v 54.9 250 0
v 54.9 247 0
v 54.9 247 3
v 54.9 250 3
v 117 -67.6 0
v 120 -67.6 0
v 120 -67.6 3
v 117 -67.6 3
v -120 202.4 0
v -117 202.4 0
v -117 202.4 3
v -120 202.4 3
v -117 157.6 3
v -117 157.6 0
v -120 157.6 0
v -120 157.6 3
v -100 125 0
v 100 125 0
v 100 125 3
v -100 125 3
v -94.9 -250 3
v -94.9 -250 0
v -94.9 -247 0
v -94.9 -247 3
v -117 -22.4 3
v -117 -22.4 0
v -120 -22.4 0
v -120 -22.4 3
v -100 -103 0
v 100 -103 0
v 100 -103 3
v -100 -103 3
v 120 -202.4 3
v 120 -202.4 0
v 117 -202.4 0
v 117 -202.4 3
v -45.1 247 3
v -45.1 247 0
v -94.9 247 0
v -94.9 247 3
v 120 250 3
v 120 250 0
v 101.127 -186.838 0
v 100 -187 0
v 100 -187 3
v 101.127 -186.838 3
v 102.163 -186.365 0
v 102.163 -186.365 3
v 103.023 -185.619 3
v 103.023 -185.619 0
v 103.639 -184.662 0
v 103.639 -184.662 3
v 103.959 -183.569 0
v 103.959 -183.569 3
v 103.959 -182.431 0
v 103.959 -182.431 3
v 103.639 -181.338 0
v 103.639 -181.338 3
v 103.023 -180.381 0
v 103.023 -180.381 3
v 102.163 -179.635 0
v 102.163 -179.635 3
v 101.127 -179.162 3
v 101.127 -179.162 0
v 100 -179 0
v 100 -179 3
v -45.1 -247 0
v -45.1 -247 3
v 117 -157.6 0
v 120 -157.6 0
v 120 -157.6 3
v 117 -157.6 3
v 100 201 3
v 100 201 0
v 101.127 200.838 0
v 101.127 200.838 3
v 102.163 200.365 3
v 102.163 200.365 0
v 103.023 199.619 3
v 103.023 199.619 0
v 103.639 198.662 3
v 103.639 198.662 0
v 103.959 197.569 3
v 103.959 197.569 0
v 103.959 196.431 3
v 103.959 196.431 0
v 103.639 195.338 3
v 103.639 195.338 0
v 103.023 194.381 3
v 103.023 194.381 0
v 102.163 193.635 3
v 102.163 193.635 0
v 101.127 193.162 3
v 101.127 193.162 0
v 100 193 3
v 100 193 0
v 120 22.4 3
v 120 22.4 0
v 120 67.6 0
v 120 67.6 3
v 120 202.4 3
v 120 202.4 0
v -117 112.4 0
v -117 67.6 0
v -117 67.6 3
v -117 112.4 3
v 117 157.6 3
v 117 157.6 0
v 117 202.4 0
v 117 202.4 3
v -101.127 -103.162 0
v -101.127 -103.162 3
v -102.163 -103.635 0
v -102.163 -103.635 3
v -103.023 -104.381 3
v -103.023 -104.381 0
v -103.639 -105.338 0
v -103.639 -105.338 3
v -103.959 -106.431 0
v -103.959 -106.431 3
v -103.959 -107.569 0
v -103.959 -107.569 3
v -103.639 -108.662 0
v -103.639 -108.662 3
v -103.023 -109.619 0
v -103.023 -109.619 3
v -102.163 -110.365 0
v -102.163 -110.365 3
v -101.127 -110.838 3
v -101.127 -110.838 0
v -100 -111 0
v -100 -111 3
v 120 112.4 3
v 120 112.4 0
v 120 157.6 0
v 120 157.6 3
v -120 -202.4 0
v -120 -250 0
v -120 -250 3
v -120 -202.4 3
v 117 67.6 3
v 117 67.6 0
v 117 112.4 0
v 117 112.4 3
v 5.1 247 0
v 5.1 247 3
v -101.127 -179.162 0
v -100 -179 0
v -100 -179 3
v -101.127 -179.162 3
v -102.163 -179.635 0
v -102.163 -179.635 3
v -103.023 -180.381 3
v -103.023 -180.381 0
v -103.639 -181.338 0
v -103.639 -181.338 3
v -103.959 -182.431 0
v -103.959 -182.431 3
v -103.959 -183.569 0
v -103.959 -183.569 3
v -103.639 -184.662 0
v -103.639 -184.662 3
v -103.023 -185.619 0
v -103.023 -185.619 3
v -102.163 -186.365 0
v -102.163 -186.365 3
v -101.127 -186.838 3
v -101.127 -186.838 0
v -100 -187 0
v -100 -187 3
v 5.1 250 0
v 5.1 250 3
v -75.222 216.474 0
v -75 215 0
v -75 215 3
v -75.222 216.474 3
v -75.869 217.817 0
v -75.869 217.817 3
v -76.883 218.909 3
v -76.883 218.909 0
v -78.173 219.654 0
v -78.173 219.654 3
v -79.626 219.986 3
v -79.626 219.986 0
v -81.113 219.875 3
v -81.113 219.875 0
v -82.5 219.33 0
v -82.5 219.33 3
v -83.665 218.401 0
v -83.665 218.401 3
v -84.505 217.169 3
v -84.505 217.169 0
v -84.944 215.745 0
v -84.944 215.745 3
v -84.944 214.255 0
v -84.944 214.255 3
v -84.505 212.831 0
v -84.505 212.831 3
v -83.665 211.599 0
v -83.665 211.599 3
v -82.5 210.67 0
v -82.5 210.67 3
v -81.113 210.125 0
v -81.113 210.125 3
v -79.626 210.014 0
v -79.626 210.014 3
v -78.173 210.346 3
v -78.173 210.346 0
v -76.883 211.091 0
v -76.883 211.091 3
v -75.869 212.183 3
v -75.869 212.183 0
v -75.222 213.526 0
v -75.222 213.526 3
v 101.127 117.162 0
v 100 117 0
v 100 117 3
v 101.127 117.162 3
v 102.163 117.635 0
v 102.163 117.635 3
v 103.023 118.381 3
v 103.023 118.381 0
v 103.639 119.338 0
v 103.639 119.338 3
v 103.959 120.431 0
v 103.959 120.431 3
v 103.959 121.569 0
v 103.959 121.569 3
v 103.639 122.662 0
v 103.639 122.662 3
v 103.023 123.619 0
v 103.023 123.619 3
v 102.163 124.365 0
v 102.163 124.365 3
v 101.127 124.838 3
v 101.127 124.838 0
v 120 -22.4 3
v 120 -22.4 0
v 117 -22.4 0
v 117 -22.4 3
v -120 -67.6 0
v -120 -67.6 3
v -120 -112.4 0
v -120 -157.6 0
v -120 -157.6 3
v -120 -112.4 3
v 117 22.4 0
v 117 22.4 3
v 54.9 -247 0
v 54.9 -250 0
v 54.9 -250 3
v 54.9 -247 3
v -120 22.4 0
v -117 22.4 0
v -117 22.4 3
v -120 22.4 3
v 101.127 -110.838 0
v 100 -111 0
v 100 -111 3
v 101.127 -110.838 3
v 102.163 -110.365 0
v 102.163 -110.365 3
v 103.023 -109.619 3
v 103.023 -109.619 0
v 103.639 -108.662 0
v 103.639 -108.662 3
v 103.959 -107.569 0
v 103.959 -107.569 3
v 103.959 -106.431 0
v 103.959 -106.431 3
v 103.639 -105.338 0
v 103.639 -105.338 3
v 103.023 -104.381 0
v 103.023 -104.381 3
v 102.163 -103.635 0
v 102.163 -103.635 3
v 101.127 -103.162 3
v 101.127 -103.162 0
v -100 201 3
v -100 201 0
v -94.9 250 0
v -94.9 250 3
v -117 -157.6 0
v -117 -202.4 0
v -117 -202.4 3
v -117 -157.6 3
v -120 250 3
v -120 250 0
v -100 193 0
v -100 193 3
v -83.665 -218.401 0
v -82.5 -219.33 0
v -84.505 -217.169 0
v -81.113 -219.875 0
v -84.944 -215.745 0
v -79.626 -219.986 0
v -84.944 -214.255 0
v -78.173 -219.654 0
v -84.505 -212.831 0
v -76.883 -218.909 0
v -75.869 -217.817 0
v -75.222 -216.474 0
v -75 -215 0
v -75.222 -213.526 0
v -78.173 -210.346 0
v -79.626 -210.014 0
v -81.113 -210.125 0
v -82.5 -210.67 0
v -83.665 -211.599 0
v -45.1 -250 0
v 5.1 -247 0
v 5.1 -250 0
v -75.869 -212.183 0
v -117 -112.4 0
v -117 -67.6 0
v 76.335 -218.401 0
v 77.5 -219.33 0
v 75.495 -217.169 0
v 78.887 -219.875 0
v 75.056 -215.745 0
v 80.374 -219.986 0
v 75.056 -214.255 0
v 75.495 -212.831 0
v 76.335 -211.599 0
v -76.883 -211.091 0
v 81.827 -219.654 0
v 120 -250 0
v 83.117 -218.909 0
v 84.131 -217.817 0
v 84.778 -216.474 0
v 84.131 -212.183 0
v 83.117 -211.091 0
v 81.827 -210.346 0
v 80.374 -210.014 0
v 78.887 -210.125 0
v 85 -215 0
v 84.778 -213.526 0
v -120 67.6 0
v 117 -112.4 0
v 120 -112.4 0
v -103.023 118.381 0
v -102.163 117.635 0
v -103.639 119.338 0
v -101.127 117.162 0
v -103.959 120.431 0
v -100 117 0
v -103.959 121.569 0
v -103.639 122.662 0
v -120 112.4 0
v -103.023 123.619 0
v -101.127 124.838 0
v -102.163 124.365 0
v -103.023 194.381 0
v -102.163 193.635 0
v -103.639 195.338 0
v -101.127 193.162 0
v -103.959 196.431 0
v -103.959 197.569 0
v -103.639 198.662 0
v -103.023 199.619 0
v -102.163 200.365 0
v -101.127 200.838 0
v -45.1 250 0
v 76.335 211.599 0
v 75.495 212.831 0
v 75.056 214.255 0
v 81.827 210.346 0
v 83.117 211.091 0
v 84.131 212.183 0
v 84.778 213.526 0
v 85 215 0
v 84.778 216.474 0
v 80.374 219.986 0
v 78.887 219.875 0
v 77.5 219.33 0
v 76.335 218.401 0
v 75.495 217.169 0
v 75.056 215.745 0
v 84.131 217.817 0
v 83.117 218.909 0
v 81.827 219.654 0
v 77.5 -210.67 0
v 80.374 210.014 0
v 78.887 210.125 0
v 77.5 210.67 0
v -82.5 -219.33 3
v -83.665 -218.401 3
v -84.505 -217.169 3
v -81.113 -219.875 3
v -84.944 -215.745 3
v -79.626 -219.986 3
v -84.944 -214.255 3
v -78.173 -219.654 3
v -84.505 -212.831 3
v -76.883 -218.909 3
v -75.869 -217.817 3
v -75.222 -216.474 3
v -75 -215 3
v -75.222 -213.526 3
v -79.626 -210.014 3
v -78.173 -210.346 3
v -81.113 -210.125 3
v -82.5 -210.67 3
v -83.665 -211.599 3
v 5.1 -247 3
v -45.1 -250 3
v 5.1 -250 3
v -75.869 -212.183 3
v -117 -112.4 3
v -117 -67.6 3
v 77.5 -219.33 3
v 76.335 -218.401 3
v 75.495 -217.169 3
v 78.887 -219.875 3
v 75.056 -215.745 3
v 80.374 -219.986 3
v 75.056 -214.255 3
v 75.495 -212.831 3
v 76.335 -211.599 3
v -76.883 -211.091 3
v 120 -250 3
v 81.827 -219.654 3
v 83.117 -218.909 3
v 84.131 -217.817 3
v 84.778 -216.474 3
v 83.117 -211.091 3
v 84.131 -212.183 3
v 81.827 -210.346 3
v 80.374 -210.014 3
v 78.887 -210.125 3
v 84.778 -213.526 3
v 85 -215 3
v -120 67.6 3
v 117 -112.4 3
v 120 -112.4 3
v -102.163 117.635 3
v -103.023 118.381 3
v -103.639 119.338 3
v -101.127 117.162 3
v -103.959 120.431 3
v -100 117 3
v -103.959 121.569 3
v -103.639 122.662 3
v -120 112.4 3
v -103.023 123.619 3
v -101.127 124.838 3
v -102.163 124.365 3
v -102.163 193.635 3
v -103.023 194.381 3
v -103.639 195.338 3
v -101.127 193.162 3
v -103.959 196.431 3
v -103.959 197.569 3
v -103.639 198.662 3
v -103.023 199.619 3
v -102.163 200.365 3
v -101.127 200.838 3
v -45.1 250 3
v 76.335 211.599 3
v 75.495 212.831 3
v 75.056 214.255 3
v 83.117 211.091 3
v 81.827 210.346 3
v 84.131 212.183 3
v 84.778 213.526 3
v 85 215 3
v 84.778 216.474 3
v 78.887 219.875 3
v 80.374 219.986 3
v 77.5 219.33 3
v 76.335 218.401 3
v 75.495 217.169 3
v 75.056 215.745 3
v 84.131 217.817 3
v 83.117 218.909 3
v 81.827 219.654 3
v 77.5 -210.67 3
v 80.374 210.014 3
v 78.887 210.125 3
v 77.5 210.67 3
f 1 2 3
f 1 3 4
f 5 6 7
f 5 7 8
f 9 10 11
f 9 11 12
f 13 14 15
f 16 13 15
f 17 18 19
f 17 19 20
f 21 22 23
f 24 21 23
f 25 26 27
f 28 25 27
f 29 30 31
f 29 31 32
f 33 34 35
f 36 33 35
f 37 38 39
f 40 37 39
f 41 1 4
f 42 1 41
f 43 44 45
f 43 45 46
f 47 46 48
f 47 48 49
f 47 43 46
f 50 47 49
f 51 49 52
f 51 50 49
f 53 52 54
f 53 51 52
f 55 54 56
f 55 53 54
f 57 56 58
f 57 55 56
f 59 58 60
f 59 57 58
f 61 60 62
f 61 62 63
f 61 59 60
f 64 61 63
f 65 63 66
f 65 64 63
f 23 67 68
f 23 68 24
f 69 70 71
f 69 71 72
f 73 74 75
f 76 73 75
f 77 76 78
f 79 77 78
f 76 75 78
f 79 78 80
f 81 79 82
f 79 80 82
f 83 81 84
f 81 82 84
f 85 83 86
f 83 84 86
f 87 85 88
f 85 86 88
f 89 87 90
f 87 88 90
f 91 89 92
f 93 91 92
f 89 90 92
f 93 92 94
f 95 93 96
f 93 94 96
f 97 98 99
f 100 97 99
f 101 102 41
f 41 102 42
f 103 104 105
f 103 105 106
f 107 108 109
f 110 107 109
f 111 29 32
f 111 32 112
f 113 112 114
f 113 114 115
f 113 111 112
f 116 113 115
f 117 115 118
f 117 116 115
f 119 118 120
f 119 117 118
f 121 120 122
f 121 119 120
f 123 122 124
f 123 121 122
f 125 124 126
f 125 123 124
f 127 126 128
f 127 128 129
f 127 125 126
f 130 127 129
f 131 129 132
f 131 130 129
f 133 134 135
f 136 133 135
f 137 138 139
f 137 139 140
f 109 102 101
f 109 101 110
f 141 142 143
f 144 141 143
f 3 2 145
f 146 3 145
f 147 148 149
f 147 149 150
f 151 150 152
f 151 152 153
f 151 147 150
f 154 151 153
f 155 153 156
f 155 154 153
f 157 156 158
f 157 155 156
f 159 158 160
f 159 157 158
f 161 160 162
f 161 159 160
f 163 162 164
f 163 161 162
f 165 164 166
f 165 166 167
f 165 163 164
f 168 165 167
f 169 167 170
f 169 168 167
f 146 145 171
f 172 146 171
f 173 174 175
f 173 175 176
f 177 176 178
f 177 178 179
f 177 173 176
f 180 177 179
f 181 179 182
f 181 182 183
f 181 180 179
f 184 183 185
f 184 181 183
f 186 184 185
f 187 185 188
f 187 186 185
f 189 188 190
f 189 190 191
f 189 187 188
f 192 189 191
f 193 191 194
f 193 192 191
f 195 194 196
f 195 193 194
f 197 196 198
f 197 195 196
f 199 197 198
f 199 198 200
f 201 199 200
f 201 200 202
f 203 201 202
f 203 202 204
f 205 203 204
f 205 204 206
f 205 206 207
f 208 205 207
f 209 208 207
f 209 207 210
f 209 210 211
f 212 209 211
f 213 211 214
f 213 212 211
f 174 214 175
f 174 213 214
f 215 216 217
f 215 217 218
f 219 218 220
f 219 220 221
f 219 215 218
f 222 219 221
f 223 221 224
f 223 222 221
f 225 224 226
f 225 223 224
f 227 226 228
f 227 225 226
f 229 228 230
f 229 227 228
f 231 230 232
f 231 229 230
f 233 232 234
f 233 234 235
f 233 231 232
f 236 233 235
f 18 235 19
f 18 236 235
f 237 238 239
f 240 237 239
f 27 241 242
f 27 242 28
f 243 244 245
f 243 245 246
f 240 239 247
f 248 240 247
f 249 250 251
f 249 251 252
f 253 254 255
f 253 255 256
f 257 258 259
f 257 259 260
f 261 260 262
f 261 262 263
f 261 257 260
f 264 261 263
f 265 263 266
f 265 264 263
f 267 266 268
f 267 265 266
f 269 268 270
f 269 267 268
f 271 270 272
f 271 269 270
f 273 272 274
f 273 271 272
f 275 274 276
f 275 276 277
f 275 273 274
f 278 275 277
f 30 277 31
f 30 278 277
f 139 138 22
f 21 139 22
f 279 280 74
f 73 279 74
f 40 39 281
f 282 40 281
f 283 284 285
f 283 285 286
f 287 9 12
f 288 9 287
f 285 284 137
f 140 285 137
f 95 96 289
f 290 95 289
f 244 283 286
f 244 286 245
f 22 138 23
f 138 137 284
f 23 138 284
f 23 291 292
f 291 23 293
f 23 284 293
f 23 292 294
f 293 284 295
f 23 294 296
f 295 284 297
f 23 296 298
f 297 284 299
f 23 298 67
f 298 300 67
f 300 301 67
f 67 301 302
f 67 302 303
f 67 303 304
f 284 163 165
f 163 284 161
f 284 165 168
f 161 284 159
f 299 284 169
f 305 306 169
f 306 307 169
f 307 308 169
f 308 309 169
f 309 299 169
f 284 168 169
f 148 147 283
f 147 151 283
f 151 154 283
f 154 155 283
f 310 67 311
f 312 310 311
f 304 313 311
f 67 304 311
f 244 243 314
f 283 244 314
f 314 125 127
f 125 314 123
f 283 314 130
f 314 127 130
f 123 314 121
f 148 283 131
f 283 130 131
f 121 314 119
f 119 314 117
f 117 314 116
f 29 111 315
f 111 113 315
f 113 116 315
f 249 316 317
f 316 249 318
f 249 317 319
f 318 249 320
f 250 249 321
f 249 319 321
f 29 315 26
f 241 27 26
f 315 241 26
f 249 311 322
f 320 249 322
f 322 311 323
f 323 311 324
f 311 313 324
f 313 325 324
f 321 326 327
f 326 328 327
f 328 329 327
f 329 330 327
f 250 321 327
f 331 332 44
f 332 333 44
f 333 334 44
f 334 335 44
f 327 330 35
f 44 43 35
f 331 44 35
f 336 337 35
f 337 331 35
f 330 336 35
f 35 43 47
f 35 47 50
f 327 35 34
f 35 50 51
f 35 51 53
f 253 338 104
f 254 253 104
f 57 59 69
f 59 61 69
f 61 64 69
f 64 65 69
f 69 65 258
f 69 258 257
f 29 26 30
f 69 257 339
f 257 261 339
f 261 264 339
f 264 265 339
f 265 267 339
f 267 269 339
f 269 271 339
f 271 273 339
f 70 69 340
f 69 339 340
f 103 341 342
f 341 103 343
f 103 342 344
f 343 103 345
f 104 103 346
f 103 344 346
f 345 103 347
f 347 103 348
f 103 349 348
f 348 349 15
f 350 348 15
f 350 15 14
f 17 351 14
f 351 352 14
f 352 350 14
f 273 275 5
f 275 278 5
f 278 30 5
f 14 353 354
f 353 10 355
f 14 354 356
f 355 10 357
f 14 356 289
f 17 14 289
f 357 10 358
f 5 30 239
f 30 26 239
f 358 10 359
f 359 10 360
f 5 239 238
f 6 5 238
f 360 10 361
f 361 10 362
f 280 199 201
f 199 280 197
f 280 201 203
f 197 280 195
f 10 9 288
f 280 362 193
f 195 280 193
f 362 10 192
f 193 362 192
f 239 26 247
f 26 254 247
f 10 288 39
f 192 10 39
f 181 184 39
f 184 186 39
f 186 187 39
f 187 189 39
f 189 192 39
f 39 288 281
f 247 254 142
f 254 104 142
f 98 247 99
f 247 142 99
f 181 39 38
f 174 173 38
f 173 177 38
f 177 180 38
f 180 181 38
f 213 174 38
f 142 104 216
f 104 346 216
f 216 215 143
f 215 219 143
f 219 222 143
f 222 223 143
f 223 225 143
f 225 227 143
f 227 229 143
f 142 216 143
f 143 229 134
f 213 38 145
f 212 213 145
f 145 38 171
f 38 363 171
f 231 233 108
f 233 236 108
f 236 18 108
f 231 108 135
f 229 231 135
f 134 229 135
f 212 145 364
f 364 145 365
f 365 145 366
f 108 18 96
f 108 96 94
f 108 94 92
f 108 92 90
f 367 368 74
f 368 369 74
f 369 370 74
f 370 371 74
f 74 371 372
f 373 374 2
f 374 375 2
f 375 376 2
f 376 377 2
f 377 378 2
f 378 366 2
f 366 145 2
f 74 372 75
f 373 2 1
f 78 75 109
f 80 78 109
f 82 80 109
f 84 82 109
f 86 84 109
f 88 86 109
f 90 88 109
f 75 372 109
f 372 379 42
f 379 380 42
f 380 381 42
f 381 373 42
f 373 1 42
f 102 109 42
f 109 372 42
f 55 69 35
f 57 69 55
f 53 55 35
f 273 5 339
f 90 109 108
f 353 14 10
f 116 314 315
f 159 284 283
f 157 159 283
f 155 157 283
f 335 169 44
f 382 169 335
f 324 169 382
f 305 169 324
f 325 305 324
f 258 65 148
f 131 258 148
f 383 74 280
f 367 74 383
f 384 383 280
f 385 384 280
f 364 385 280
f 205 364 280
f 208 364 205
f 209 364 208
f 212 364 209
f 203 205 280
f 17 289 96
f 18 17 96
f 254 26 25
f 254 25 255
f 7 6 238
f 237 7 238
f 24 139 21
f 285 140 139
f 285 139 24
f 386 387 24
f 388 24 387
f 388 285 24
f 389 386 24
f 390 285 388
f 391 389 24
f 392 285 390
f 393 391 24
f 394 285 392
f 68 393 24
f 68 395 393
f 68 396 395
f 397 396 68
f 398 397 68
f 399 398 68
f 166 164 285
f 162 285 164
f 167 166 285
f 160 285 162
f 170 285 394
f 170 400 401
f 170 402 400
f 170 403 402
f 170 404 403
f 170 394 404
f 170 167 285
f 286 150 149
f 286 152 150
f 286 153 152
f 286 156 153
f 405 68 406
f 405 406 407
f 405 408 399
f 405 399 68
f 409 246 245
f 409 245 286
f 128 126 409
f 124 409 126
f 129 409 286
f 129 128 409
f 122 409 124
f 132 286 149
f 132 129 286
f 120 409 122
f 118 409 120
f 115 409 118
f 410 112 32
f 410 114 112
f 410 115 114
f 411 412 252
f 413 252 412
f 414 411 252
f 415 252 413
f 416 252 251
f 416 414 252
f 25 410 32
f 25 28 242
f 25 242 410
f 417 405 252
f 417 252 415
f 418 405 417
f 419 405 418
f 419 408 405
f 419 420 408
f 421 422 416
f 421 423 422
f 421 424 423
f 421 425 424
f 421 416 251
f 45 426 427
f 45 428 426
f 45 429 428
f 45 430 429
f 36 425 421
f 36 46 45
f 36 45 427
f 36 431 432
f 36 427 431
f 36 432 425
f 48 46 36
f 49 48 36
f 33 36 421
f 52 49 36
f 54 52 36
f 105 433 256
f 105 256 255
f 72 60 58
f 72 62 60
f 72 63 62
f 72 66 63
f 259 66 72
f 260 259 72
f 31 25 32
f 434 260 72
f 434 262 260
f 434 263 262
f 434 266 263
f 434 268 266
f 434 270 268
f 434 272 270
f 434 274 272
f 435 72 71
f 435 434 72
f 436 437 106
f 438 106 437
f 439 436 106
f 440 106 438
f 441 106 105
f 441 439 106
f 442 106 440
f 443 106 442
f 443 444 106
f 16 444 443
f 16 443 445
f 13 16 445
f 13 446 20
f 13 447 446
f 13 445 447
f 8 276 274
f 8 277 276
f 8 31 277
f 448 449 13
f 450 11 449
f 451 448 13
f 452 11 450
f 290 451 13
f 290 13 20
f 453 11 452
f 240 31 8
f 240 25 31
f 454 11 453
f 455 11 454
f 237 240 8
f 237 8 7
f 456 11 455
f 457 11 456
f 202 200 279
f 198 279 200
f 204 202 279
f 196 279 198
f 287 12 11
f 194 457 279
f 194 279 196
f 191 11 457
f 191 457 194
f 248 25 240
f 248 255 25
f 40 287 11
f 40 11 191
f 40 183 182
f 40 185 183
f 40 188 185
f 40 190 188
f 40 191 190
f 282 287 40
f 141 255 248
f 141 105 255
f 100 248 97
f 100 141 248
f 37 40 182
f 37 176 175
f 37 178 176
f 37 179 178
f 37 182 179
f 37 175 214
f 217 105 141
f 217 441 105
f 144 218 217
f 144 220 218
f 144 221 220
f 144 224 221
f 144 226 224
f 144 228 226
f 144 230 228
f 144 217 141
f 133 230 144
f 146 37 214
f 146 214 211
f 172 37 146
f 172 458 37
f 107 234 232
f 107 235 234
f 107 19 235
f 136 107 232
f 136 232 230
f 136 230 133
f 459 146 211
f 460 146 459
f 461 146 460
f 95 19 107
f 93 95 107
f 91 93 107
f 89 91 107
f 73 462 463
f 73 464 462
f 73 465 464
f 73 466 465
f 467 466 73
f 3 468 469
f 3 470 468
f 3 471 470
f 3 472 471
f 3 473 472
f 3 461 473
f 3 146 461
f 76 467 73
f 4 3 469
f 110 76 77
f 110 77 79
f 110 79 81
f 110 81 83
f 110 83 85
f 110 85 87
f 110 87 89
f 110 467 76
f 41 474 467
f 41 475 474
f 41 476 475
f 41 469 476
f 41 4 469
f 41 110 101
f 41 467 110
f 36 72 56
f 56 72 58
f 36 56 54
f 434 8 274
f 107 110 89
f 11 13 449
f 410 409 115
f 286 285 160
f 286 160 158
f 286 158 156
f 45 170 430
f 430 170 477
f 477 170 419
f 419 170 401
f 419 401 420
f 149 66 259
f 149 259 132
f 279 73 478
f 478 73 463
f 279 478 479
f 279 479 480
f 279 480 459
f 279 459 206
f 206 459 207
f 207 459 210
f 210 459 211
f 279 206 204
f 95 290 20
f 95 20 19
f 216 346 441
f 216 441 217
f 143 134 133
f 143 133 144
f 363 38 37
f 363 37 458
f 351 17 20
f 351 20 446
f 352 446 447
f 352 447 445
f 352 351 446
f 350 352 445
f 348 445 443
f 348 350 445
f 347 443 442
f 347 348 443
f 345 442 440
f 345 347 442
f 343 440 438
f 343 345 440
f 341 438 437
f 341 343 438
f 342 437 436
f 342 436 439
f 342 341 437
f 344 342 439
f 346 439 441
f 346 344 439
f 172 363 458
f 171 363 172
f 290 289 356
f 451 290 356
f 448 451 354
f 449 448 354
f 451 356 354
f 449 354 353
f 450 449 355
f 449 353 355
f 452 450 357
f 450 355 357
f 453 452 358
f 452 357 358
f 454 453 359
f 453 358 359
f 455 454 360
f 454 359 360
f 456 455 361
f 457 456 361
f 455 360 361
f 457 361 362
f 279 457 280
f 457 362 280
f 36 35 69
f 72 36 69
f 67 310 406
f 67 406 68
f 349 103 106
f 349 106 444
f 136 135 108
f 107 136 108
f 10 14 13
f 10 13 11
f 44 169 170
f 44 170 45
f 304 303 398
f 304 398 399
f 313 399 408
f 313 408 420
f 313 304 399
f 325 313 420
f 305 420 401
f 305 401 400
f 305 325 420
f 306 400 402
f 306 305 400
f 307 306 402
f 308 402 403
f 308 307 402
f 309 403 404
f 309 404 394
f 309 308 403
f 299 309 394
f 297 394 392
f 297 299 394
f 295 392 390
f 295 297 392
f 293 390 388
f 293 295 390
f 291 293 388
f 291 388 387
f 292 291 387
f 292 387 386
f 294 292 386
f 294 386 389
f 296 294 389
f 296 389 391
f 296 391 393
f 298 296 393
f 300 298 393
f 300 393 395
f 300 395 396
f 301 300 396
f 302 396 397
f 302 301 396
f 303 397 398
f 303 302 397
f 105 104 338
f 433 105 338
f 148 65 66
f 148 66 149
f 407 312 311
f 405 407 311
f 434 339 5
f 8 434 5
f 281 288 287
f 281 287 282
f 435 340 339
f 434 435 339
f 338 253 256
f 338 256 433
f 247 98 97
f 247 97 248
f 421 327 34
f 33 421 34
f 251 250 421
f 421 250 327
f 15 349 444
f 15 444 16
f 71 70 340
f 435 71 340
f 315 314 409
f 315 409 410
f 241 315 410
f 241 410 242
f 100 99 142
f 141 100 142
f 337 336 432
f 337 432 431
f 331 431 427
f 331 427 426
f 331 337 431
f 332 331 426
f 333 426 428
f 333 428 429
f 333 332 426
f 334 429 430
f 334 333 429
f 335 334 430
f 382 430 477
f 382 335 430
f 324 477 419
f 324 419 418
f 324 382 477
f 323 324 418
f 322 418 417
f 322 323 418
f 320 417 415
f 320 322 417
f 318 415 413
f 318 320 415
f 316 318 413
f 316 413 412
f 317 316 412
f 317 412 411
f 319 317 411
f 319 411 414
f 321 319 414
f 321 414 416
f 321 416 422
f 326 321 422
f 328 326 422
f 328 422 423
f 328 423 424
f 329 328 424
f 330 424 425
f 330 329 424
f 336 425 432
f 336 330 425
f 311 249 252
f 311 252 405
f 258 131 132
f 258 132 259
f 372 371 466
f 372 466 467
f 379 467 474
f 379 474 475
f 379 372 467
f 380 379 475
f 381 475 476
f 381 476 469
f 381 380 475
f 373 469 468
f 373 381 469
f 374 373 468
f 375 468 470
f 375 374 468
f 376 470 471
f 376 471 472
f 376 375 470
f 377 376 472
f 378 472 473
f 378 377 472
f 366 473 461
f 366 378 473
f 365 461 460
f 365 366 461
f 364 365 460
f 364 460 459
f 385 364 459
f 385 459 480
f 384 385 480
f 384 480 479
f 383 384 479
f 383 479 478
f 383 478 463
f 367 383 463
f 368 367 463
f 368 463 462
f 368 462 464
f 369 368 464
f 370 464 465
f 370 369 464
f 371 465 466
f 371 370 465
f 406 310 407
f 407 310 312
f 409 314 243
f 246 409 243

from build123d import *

# Parameters (mm, degrees)
CROQUIS1_W              = 240
CROQUIS1_H              = 500
CROQUIS1_R              = 5
SALIENTE_EXTRUIR1_DEPTH = 3
CROQUIS5_W              = 49.8
CROQUIS5_H              = 3
CROQUIS5_W_2            = 3
CROQUIS5_H_2            = 44.8
CORTAR_EXTRUIR2_DEPTH   = 4


with BuildPart() as part:
    # Croquis1 → Saliente-Extruir1 (new body)
    with BuildSketch(Plane.XY):
        Rectangle(CROQUIS1_W, CROQUIS1_H)
        with Locations((-80, -215)):
            Circle(CROQUIS1_R, mode=Mode.SUBTRACT)
        with Locations((80, -215)):
            Circle(CROQUIS1_R, mode=Mode.SUBTRACT)
        with Locations((80, 215)):
            Circle(CROQUIS1_R, mode=Mode.SUBTRACT)
        with Locations((-80, 215)):
            Circle(CROQUIS1_R, mode=Mode.SUBTRACT)
        with BuildLine():
            Line((-100, 201), (100, 201))
            ThreePointArc((100, 201), (104, 197), (100, 193))
            Line((100, 193), (-100, 193))
            ThreePointArc((-100, 193), (-104, 197), (-100, 201))
        make_face(mode=Mode.SUBTRACT)
        with BuildLine():
            Line((-100, 117), (100, 117))
            ThreePointArc((100, 117), (104, 121), (100, 125))
            Line((100, 125), (-100, 125))
            ThreePointArc((-100, 125), (-104, 121), (-100, 117))
        make_face(mode=Mode.SUBTRACT)
        with BuildLine():
            Line((-100, -111), (100, -111))
            ThreePointArc((100, -111), (104, -107), (100, -103))
            Line((100, -103), (-100, -103))
            ThreePointArc((-100, -103), (-104, -107), (-100, -111))
        make_face(mode=Mode.SUBTRACT)
        with BuildLine():
            Line((-100, -187), (100, -187))
            ThreePointArc((100, -187), (104, -183), (100, -179))
            Line((100, -179), (-100, -179))
            ThreePointArc((-100, -179), (-104, -183), (-100, -187))
        make_face(mode=Mode.SUBTRACT)
    extrude(amount=SALIENTE_EXTRUIR1_DEPTH)

    # Croquis5 → Cortar-Extruir2 (cut, through all)
    with BuildSketch(Plane(origin=(0, 0, 0), x_dir=(-1, 0, 0), z_dir=(0, 0, -1))):
        with Locations((-30, 248.5)):
            Rectangle(CROQUIS5_W, CROQUIS5_H)
        with Locations((70, 248.5)):
            Rectangle(CROQUIS5_W, CROQUIS5_H)
        with Locations((118.5, 180)):
            Rectangle(CROQUIS5_W_2, CROQUIS5_H_2)
        with Locations((118.5, 90)):
            Rectangle(CROQUIS5_W_2, CROQUIS5_H_2)
        with Locations((118.5, 0)):
            Rectangle(CROQUIS5_W_2, CROQUIS5_H_2)
        with Locations((118.5, -90)):
            Rectangle(CROQUIS5_W_2, CROQUIS5_H_2)
        with Locations((118.5, -180)):
            Rectangle(CROQUIS5_W_2, CROQUIS5_H_2)
        with Locations((70, -248.5)):
            Rectangle(CROQUIS5_W, CROQUIS5_H)
        with Locations((-30, -248.5)):
            Rectangle(CROQUIS5_W, CROQUIS5_H)
        with Locations((-118.5, -180)):
            Rectangle(CROQUIS5_W_2, CROQUIS5_H_2)
        with Locations((-118.5, -90)):
            Rectangle(CROQUIS5_W_2, CROQUIS5_H_2)
        with Locations((-118.5, 0)):
            Rectangle(CROQUIS5_W_2, CROQUIS5_H_2)
        with Locations((-118.5, 90)):
            Rectangle(CROQUIS5_W_2, CROQUIS5_H_2)
        with Locations((-118.5, 180)):
            Rectangle(CROQUIS5_W_2, CROQUIS5_H_2)
    extrude(amount=-CORTAR_EXTRUIR2_DEPTH, mode=Mode.SUBTRACT)


solid = part.part
